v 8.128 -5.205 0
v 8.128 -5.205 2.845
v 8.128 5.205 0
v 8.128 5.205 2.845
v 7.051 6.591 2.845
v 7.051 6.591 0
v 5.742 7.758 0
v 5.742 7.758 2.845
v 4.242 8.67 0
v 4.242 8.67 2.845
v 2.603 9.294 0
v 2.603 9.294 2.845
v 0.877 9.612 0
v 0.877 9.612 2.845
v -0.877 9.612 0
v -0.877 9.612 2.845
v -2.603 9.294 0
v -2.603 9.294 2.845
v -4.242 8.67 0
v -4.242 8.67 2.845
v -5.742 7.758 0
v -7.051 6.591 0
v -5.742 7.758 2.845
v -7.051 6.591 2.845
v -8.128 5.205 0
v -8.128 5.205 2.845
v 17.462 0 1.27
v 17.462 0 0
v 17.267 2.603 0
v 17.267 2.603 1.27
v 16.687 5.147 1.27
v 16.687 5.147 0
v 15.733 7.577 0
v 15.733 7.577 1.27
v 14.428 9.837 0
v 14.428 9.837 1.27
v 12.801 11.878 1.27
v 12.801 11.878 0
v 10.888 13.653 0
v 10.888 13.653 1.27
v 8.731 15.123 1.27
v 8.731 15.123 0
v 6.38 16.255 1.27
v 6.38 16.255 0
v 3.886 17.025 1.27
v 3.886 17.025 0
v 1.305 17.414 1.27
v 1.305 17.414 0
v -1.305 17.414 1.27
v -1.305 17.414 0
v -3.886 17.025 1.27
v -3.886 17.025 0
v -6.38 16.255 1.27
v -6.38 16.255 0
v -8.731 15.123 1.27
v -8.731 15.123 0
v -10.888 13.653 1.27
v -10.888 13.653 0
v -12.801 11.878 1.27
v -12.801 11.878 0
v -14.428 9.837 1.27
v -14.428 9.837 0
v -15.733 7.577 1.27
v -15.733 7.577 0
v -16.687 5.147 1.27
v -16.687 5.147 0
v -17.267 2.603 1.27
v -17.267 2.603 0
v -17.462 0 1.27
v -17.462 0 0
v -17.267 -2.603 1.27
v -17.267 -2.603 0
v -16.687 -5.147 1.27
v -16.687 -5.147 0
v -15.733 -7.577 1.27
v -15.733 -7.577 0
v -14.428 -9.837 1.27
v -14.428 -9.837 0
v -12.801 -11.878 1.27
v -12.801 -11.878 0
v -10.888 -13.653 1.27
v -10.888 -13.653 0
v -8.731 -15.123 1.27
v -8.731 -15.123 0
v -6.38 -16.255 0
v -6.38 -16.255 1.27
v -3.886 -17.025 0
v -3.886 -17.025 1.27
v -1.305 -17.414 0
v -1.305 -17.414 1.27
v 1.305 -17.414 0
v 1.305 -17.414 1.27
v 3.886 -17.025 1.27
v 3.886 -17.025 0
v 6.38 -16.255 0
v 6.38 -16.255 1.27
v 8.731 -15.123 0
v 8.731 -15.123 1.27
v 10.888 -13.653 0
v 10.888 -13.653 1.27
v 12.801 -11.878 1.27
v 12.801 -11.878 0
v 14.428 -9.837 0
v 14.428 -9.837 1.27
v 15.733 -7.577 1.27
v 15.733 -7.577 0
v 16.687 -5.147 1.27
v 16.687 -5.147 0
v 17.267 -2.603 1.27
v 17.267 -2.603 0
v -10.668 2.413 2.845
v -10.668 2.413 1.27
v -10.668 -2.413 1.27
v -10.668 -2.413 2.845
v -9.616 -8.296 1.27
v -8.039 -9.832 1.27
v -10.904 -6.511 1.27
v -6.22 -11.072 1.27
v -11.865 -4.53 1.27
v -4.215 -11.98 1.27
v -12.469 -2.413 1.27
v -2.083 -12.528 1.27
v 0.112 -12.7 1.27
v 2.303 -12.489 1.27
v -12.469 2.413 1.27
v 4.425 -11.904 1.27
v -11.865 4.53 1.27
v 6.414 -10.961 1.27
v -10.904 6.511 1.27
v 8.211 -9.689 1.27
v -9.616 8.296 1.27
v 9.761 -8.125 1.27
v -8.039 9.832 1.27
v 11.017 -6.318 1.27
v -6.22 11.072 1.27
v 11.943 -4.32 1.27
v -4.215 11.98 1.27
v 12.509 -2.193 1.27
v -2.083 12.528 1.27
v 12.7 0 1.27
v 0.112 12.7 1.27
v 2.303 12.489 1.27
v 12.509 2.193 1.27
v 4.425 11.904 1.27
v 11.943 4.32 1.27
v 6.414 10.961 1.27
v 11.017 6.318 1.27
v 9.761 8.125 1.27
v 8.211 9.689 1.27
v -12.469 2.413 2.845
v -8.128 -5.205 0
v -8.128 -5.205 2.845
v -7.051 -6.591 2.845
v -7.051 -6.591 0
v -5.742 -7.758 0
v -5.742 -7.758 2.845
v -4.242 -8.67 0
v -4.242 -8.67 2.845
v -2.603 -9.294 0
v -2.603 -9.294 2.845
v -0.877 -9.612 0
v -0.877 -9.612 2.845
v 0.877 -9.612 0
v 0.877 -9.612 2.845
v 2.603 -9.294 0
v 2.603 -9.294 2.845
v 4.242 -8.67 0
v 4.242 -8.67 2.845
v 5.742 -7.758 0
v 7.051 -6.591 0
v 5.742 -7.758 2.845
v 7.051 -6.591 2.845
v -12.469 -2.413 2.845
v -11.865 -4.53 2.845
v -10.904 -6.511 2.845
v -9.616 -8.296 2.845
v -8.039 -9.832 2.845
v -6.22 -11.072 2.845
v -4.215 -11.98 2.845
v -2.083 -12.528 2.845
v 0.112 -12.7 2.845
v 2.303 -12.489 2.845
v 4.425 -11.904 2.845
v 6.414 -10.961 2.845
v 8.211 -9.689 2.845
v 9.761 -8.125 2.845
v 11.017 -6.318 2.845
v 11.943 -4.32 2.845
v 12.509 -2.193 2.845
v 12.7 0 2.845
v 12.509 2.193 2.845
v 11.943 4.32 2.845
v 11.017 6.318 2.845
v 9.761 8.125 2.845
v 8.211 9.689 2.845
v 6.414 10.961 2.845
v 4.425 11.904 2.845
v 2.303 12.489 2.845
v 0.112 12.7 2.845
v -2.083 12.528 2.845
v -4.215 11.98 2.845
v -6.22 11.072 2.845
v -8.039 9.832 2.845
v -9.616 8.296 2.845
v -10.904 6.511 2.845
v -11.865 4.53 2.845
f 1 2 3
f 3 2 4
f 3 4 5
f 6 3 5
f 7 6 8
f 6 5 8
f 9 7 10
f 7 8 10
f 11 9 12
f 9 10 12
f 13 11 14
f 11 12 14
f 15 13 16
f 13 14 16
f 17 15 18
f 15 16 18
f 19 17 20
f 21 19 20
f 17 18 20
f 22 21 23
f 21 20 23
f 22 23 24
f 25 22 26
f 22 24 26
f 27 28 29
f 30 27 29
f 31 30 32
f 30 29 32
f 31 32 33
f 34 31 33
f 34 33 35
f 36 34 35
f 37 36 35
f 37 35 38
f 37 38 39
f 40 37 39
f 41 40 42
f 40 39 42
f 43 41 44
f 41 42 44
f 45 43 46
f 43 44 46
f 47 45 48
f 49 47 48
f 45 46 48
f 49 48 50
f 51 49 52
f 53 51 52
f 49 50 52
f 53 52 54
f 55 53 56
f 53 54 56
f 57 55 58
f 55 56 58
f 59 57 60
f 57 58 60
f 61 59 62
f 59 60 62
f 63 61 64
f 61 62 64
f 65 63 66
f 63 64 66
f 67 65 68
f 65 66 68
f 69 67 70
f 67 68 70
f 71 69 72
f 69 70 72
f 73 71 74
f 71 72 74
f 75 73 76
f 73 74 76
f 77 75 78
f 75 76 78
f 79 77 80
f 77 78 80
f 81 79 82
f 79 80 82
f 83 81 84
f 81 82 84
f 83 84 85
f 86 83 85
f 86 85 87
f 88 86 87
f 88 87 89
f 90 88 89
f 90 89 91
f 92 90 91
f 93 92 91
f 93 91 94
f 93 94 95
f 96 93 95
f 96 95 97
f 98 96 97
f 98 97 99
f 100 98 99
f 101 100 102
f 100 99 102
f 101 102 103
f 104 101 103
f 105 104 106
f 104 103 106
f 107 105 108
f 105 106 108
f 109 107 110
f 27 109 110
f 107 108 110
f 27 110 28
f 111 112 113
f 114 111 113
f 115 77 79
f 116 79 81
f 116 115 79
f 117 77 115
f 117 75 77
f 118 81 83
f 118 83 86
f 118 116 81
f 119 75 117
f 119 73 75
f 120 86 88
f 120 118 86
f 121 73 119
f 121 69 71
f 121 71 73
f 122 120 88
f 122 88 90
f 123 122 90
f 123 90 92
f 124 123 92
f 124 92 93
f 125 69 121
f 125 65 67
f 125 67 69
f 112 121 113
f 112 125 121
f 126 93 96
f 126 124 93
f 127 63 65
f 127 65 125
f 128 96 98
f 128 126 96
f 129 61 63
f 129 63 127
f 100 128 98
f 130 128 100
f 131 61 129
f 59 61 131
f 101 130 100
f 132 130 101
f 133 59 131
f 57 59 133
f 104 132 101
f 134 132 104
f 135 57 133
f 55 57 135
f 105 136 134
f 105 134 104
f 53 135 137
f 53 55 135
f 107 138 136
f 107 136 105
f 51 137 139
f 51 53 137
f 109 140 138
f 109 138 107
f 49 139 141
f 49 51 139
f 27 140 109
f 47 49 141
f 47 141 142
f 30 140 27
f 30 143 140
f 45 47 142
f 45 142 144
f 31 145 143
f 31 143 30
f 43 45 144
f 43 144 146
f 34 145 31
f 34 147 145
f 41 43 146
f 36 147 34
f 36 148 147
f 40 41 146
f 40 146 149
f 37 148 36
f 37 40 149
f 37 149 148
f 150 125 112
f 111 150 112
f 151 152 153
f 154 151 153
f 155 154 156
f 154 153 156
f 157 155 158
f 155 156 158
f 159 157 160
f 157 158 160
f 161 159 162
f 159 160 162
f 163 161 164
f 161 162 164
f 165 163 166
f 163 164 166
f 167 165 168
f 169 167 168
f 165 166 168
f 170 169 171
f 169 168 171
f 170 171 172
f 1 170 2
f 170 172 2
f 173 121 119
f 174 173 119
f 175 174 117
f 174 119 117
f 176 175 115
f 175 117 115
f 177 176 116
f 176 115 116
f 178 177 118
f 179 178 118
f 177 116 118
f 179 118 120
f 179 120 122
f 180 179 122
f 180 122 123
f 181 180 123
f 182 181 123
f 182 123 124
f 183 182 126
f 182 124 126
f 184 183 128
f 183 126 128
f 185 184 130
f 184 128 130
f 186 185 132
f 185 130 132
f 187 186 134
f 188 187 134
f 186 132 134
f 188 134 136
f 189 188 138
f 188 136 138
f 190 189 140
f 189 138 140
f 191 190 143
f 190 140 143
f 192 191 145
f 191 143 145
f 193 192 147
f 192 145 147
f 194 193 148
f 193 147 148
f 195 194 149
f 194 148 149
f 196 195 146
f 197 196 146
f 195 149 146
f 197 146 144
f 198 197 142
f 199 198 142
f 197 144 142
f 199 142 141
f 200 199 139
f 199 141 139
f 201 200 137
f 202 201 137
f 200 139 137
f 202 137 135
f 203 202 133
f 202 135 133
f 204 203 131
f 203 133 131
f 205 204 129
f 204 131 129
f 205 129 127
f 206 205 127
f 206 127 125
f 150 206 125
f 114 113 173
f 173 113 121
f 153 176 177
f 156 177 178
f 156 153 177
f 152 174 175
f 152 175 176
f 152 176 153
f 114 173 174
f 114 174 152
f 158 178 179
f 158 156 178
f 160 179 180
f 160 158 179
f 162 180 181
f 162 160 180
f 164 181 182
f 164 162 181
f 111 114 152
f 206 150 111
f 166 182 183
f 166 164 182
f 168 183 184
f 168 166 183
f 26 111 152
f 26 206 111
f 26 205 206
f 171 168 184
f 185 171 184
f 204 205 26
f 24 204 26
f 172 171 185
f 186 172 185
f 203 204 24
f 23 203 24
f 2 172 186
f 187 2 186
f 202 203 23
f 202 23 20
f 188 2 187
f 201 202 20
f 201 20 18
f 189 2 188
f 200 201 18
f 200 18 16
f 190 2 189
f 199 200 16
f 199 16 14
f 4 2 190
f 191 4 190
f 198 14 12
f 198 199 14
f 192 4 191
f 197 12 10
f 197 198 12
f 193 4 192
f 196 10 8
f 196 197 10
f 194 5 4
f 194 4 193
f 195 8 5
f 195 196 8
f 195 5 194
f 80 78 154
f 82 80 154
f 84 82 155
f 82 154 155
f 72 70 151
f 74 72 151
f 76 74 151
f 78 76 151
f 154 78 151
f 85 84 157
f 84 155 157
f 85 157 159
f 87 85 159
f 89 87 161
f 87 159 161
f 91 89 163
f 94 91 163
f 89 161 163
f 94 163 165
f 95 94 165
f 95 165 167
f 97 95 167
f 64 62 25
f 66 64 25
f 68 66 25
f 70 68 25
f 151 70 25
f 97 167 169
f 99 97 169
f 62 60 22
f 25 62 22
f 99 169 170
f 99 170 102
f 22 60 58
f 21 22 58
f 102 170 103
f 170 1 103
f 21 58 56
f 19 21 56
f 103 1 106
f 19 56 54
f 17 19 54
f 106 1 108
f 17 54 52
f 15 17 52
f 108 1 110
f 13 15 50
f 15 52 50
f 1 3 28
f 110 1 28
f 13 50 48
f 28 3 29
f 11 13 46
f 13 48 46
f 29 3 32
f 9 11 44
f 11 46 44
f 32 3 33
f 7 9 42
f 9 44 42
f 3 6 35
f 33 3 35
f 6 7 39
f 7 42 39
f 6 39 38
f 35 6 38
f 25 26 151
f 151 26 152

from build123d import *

# Parameters (mm, degrees)
F0_R     = 17.4625
F1_DEPTH = 1.27
F3_DEPTH = 1.5748
F5_DEPTH = 2.8458


with BuildPart() as f1:
    # F0 (on Top) → F1 (new body)
    with BuildSketch(Plane.XY):
        Circle(F0_R)
    extrude(amount=F1_DEPTH)

    # F2 (on face) → F3 (join)
    with BuildSketch(Plane.XY.offset(1.27)):
        with BuildLine():
            Line((-10.668, -2.413), (-12.468658, -2.413))
            ThreePointArc((-12.468658, -2.413), (12.7, 0), (-12.468658, 2.413))
            Line((-12.468658, 2.413), (-10.668, 2.413))
            Line((-10.668, 2.413), (-10.668, -2.413))
        make_face()
    extrude(amount=F3_DEPTH)

    # F4 (on face) → F5 (cut, through all)
    with BuildSketch(Plane.XY.offset(2.8448)):
        with BuildLine():
            Line((-8.128, 5.205451), (-8.128, -5.205451))
            ThreePointArc((-8.128, -5.205451), (0, -9.652), (8.128, -5.205451))
            Line((8.128, -5.205451), (8.128, 5.205451))
            ThreePointArc((8.128, 5.205451), (0, 9.652), (-8.128, 5.205451))
        make_face()
    extrude(amount=-F5_DEPTH, mode=Mode.SUBTRACT)


solid = f1.part
